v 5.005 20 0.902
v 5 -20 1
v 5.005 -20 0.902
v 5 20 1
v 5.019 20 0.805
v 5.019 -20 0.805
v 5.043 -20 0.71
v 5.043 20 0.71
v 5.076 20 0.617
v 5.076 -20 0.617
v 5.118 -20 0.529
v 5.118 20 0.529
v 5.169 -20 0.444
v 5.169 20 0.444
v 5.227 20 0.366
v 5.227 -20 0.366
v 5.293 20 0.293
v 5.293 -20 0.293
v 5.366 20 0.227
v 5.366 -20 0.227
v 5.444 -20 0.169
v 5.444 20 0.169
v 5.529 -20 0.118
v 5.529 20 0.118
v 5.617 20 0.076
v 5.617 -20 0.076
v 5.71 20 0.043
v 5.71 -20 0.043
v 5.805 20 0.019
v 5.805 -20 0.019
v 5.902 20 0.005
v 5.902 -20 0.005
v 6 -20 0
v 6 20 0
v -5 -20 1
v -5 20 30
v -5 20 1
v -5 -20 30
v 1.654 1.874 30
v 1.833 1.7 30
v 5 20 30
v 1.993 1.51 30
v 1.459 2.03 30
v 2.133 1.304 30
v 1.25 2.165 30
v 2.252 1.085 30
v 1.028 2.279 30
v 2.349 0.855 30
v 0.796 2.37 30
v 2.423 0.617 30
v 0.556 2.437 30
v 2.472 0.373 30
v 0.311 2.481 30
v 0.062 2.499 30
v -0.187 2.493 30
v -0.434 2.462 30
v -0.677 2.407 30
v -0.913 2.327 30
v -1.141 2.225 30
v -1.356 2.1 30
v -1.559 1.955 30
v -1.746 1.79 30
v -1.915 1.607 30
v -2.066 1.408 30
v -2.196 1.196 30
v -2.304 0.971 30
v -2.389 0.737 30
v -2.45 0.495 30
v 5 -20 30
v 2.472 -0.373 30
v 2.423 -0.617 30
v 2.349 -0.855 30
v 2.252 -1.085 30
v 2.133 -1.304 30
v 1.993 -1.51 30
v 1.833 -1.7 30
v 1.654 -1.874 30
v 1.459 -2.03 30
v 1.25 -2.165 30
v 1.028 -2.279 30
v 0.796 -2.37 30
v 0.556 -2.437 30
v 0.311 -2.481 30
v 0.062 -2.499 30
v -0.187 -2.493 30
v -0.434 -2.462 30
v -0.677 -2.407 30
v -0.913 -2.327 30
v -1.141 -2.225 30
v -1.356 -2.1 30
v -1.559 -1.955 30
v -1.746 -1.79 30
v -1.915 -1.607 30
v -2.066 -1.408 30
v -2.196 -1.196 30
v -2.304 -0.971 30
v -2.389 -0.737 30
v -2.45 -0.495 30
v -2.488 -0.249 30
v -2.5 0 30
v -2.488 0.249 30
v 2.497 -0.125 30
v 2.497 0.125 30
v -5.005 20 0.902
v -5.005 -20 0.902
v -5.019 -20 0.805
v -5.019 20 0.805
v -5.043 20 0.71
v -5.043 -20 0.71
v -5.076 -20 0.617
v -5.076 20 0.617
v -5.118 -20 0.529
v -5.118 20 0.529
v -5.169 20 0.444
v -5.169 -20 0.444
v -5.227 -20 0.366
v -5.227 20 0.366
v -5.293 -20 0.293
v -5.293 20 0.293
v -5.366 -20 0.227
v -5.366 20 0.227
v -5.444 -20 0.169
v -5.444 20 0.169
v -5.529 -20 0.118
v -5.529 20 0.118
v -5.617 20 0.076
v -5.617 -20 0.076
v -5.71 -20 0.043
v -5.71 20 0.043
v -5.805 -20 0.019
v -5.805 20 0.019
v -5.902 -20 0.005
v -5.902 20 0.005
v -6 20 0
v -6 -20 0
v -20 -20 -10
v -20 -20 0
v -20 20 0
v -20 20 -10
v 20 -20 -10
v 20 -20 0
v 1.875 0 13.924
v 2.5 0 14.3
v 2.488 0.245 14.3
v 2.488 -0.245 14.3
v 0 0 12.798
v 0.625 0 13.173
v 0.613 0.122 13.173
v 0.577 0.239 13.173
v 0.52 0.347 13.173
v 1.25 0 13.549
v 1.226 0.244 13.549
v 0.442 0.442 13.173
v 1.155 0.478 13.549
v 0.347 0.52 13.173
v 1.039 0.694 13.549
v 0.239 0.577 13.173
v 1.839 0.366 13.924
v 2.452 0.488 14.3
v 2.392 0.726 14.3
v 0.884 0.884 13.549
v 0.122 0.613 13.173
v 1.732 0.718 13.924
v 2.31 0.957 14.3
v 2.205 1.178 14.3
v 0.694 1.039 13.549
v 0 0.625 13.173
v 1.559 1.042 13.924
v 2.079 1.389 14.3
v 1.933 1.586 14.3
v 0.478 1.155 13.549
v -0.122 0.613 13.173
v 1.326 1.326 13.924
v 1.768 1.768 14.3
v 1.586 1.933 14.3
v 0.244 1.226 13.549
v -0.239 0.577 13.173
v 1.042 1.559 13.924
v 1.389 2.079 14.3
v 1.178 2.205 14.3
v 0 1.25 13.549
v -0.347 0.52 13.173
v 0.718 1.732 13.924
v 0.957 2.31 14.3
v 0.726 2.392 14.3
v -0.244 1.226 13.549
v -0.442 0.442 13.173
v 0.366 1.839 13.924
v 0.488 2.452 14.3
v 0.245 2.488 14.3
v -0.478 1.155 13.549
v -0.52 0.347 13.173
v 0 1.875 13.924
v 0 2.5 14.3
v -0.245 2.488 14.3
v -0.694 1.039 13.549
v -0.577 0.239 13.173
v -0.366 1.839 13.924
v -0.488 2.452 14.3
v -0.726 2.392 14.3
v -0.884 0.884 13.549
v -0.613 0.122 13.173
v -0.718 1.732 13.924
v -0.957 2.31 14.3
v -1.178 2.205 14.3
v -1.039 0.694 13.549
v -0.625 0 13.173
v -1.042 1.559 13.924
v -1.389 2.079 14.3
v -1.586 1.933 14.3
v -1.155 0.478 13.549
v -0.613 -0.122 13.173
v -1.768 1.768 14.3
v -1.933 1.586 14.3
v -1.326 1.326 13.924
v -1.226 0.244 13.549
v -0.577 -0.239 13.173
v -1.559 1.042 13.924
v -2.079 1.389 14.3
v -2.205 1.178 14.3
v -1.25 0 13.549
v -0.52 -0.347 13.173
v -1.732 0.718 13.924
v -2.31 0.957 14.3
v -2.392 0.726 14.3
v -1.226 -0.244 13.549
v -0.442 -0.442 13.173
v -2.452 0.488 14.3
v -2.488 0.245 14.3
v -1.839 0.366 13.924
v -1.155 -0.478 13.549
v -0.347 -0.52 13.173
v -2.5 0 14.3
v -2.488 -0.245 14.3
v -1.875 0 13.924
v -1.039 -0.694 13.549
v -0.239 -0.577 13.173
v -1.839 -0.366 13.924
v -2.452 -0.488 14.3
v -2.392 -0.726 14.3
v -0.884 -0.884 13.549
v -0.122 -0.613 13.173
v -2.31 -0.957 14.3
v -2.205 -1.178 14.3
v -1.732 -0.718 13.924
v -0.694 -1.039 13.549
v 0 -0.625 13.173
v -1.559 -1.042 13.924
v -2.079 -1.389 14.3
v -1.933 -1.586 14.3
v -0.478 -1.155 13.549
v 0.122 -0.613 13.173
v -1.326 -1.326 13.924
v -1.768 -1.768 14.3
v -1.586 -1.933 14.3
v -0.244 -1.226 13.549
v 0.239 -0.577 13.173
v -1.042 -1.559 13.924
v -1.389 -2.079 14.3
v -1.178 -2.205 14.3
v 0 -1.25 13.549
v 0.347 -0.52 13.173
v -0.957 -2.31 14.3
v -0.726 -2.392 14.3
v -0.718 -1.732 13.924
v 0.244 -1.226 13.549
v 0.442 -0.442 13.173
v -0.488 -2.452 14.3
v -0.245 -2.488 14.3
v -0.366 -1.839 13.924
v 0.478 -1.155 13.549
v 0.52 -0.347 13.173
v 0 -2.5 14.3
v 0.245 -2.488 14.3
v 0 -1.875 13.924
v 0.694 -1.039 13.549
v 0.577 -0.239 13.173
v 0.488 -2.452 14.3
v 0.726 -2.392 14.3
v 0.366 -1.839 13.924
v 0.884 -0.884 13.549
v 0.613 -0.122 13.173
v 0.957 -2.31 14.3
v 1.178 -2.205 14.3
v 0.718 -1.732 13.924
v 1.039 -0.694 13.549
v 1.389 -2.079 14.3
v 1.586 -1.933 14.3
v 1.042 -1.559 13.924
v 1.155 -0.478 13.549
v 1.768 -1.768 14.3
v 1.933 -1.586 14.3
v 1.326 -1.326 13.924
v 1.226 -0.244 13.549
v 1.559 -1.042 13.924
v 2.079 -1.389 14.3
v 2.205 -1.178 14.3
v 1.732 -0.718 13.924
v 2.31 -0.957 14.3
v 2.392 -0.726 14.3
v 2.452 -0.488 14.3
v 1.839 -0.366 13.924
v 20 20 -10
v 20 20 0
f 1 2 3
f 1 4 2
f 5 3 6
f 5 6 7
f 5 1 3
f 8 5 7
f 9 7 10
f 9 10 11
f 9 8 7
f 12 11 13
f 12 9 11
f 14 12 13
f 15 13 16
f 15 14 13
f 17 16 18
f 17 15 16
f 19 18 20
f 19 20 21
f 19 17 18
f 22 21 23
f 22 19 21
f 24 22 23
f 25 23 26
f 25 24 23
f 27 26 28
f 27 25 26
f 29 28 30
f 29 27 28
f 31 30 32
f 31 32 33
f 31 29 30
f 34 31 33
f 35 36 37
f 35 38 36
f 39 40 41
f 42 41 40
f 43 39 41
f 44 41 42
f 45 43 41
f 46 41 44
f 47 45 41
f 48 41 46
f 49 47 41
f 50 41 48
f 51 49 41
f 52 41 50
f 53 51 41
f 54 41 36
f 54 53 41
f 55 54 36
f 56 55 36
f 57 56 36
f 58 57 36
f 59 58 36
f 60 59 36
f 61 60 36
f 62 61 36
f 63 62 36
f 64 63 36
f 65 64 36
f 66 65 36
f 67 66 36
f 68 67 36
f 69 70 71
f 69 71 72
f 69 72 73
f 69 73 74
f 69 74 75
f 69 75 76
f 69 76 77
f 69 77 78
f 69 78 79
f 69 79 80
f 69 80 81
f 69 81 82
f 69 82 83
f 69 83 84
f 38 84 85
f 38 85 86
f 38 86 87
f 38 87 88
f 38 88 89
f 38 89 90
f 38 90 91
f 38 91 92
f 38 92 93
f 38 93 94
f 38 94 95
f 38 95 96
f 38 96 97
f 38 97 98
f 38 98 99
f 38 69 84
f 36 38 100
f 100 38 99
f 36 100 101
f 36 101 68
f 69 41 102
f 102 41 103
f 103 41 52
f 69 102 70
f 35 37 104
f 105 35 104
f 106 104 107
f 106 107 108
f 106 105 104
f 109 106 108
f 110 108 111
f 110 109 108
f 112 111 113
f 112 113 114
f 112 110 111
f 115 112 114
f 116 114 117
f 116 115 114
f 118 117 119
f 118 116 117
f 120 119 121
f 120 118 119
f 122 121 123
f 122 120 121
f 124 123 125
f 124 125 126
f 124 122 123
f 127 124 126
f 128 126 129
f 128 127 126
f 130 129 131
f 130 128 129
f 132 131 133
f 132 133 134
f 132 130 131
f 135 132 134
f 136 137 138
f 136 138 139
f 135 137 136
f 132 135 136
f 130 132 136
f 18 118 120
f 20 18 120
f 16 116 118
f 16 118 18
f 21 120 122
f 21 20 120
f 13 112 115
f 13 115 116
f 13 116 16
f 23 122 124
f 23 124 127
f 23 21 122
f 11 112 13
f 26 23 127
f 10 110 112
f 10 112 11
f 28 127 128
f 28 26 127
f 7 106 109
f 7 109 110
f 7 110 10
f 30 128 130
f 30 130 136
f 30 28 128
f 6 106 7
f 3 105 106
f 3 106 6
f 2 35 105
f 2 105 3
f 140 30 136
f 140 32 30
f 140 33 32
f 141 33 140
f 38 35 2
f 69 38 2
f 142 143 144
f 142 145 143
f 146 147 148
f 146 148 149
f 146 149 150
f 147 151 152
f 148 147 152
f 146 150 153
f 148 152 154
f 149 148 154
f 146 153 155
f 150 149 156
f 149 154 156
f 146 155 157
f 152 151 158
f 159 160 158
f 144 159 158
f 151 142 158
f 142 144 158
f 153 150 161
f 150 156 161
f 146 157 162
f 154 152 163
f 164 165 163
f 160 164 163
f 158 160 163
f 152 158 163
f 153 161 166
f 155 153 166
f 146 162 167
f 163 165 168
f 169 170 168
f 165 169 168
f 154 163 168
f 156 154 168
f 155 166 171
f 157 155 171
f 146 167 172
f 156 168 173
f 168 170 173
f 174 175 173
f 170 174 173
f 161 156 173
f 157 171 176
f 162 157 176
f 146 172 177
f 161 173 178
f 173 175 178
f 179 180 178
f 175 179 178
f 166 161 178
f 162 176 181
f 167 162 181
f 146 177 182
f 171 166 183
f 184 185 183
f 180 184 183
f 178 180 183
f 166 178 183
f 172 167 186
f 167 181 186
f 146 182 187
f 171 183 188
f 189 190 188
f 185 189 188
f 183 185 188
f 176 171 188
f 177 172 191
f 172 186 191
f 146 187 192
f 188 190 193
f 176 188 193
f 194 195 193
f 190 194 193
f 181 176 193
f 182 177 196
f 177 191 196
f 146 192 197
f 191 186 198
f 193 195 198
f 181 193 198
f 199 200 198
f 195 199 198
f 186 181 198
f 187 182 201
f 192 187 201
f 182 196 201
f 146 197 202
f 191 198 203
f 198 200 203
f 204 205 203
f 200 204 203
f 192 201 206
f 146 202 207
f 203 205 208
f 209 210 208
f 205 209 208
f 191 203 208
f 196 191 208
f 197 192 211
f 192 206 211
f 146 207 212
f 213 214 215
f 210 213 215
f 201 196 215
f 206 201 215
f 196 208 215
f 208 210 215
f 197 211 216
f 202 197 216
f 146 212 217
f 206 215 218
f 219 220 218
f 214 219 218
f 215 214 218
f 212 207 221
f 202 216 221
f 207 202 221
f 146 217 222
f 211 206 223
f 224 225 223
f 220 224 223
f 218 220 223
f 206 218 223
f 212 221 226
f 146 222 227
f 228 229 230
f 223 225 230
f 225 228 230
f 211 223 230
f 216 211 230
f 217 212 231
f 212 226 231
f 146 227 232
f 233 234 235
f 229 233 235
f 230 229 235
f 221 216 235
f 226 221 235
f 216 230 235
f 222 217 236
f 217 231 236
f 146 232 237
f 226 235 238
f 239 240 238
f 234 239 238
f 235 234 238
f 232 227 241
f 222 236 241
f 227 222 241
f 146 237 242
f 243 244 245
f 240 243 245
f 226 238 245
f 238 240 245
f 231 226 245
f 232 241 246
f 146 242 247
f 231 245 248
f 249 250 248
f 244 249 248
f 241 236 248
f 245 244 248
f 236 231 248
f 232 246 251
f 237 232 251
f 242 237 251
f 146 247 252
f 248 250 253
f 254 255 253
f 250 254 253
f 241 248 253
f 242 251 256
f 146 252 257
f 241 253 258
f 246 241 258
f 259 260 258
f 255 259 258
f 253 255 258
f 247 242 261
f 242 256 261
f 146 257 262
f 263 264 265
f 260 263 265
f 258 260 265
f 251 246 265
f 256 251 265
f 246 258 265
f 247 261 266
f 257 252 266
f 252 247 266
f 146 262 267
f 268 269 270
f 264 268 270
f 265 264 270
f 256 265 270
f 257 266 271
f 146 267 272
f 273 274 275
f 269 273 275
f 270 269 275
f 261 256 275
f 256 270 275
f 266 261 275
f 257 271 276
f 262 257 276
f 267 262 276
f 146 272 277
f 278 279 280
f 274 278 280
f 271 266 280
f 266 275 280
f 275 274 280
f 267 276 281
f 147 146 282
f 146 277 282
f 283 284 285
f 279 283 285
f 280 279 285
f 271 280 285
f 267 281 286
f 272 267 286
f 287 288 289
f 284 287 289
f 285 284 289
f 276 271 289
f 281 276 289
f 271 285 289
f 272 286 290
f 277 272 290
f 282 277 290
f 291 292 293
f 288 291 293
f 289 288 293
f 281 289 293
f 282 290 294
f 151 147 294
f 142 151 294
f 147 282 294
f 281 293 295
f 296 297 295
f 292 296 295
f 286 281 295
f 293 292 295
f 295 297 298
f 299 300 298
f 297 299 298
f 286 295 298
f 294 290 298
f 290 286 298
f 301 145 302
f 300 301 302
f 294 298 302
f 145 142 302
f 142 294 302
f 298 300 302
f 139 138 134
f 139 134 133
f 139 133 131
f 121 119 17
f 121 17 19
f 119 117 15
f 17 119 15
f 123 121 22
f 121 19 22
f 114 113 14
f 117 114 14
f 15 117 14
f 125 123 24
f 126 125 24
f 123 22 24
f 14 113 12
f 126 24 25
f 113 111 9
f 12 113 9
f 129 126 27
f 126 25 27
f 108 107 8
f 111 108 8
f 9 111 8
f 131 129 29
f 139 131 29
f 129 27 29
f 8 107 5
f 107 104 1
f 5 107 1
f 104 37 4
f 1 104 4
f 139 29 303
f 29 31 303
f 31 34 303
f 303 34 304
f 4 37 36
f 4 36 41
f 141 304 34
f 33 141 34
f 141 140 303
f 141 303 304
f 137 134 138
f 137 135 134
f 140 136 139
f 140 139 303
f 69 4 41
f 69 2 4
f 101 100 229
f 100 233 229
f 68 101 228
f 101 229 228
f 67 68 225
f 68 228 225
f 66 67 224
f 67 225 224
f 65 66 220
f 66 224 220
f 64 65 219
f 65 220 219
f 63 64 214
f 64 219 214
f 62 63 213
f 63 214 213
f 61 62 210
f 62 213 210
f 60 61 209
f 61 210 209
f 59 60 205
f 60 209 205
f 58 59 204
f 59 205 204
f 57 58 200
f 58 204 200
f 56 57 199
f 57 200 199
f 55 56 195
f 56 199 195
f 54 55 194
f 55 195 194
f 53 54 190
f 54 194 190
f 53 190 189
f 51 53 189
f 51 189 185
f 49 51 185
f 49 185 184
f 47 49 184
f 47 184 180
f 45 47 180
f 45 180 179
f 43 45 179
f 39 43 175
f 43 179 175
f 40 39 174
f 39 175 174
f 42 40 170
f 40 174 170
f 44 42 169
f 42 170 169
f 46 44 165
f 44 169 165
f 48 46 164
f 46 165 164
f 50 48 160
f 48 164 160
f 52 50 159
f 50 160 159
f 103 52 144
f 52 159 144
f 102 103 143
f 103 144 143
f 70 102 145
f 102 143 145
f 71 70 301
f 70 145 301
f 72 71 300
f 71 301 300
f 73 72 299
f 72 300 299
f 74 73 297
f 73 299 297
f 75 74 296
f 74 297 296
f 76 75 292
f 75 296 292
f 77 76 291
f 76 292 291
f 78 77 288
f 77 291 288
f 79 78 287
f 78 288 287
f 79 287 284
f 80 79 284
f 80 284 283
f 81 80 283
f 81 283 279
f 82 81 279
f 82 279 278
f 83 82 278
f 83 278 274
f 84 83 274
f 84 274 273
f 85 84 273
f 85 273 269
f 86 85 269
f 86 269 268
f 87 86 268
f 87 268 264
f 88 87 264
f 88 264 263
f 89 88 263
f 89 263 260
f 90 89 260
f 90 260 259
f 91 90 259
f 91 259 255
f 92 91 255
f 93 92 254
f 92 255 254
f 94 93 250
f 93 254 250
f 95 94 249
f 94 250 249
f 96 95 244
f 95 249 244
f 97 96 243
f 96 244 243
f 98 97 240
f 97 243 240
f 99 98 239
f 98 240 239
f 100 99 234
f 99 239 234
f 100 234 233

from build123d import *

# Parameters (mm, degrees)
F1_DEPTH = 20
F3_D     = 5
F3_DEPTH = 15.7
F3_TIP   = 1.5021515476
F4_R     = 1


with BuildPart() as f1:
    # F0 (on Front) → F1 (new body, symmetric)
    with BuildSketch(Plane.XZ):
        Polygon((5, 30), (-5, 30), (-5, 0), (-20, 0), (-20, -10), (20, -10), (20, 0), (5, 0), align=None)
    extrude(amount=F1_DEPTH, both=True)

    # F3
    with Locations(Plane.XY.offset(30)):
        with Locations((0, 0)):
            Hole(F3_D / 2, depth=F3_DEPTH)
            with Locations((0, 0, -(F3_DEPTH + F3_TIP / 2))):  # 118° drill point
                Cone(0, F3_D / 2, F3_TIP, mode=Mode.SUBTRACT)

    # F4
    f4_edges = [f1.edges().sort_by_distance(p)[0] for p in [
        (5, 0, 0),
        (-5, 0, 0),
    ]]
    fillet(f4_edges, radius=F4_R)


solid = f1.part
